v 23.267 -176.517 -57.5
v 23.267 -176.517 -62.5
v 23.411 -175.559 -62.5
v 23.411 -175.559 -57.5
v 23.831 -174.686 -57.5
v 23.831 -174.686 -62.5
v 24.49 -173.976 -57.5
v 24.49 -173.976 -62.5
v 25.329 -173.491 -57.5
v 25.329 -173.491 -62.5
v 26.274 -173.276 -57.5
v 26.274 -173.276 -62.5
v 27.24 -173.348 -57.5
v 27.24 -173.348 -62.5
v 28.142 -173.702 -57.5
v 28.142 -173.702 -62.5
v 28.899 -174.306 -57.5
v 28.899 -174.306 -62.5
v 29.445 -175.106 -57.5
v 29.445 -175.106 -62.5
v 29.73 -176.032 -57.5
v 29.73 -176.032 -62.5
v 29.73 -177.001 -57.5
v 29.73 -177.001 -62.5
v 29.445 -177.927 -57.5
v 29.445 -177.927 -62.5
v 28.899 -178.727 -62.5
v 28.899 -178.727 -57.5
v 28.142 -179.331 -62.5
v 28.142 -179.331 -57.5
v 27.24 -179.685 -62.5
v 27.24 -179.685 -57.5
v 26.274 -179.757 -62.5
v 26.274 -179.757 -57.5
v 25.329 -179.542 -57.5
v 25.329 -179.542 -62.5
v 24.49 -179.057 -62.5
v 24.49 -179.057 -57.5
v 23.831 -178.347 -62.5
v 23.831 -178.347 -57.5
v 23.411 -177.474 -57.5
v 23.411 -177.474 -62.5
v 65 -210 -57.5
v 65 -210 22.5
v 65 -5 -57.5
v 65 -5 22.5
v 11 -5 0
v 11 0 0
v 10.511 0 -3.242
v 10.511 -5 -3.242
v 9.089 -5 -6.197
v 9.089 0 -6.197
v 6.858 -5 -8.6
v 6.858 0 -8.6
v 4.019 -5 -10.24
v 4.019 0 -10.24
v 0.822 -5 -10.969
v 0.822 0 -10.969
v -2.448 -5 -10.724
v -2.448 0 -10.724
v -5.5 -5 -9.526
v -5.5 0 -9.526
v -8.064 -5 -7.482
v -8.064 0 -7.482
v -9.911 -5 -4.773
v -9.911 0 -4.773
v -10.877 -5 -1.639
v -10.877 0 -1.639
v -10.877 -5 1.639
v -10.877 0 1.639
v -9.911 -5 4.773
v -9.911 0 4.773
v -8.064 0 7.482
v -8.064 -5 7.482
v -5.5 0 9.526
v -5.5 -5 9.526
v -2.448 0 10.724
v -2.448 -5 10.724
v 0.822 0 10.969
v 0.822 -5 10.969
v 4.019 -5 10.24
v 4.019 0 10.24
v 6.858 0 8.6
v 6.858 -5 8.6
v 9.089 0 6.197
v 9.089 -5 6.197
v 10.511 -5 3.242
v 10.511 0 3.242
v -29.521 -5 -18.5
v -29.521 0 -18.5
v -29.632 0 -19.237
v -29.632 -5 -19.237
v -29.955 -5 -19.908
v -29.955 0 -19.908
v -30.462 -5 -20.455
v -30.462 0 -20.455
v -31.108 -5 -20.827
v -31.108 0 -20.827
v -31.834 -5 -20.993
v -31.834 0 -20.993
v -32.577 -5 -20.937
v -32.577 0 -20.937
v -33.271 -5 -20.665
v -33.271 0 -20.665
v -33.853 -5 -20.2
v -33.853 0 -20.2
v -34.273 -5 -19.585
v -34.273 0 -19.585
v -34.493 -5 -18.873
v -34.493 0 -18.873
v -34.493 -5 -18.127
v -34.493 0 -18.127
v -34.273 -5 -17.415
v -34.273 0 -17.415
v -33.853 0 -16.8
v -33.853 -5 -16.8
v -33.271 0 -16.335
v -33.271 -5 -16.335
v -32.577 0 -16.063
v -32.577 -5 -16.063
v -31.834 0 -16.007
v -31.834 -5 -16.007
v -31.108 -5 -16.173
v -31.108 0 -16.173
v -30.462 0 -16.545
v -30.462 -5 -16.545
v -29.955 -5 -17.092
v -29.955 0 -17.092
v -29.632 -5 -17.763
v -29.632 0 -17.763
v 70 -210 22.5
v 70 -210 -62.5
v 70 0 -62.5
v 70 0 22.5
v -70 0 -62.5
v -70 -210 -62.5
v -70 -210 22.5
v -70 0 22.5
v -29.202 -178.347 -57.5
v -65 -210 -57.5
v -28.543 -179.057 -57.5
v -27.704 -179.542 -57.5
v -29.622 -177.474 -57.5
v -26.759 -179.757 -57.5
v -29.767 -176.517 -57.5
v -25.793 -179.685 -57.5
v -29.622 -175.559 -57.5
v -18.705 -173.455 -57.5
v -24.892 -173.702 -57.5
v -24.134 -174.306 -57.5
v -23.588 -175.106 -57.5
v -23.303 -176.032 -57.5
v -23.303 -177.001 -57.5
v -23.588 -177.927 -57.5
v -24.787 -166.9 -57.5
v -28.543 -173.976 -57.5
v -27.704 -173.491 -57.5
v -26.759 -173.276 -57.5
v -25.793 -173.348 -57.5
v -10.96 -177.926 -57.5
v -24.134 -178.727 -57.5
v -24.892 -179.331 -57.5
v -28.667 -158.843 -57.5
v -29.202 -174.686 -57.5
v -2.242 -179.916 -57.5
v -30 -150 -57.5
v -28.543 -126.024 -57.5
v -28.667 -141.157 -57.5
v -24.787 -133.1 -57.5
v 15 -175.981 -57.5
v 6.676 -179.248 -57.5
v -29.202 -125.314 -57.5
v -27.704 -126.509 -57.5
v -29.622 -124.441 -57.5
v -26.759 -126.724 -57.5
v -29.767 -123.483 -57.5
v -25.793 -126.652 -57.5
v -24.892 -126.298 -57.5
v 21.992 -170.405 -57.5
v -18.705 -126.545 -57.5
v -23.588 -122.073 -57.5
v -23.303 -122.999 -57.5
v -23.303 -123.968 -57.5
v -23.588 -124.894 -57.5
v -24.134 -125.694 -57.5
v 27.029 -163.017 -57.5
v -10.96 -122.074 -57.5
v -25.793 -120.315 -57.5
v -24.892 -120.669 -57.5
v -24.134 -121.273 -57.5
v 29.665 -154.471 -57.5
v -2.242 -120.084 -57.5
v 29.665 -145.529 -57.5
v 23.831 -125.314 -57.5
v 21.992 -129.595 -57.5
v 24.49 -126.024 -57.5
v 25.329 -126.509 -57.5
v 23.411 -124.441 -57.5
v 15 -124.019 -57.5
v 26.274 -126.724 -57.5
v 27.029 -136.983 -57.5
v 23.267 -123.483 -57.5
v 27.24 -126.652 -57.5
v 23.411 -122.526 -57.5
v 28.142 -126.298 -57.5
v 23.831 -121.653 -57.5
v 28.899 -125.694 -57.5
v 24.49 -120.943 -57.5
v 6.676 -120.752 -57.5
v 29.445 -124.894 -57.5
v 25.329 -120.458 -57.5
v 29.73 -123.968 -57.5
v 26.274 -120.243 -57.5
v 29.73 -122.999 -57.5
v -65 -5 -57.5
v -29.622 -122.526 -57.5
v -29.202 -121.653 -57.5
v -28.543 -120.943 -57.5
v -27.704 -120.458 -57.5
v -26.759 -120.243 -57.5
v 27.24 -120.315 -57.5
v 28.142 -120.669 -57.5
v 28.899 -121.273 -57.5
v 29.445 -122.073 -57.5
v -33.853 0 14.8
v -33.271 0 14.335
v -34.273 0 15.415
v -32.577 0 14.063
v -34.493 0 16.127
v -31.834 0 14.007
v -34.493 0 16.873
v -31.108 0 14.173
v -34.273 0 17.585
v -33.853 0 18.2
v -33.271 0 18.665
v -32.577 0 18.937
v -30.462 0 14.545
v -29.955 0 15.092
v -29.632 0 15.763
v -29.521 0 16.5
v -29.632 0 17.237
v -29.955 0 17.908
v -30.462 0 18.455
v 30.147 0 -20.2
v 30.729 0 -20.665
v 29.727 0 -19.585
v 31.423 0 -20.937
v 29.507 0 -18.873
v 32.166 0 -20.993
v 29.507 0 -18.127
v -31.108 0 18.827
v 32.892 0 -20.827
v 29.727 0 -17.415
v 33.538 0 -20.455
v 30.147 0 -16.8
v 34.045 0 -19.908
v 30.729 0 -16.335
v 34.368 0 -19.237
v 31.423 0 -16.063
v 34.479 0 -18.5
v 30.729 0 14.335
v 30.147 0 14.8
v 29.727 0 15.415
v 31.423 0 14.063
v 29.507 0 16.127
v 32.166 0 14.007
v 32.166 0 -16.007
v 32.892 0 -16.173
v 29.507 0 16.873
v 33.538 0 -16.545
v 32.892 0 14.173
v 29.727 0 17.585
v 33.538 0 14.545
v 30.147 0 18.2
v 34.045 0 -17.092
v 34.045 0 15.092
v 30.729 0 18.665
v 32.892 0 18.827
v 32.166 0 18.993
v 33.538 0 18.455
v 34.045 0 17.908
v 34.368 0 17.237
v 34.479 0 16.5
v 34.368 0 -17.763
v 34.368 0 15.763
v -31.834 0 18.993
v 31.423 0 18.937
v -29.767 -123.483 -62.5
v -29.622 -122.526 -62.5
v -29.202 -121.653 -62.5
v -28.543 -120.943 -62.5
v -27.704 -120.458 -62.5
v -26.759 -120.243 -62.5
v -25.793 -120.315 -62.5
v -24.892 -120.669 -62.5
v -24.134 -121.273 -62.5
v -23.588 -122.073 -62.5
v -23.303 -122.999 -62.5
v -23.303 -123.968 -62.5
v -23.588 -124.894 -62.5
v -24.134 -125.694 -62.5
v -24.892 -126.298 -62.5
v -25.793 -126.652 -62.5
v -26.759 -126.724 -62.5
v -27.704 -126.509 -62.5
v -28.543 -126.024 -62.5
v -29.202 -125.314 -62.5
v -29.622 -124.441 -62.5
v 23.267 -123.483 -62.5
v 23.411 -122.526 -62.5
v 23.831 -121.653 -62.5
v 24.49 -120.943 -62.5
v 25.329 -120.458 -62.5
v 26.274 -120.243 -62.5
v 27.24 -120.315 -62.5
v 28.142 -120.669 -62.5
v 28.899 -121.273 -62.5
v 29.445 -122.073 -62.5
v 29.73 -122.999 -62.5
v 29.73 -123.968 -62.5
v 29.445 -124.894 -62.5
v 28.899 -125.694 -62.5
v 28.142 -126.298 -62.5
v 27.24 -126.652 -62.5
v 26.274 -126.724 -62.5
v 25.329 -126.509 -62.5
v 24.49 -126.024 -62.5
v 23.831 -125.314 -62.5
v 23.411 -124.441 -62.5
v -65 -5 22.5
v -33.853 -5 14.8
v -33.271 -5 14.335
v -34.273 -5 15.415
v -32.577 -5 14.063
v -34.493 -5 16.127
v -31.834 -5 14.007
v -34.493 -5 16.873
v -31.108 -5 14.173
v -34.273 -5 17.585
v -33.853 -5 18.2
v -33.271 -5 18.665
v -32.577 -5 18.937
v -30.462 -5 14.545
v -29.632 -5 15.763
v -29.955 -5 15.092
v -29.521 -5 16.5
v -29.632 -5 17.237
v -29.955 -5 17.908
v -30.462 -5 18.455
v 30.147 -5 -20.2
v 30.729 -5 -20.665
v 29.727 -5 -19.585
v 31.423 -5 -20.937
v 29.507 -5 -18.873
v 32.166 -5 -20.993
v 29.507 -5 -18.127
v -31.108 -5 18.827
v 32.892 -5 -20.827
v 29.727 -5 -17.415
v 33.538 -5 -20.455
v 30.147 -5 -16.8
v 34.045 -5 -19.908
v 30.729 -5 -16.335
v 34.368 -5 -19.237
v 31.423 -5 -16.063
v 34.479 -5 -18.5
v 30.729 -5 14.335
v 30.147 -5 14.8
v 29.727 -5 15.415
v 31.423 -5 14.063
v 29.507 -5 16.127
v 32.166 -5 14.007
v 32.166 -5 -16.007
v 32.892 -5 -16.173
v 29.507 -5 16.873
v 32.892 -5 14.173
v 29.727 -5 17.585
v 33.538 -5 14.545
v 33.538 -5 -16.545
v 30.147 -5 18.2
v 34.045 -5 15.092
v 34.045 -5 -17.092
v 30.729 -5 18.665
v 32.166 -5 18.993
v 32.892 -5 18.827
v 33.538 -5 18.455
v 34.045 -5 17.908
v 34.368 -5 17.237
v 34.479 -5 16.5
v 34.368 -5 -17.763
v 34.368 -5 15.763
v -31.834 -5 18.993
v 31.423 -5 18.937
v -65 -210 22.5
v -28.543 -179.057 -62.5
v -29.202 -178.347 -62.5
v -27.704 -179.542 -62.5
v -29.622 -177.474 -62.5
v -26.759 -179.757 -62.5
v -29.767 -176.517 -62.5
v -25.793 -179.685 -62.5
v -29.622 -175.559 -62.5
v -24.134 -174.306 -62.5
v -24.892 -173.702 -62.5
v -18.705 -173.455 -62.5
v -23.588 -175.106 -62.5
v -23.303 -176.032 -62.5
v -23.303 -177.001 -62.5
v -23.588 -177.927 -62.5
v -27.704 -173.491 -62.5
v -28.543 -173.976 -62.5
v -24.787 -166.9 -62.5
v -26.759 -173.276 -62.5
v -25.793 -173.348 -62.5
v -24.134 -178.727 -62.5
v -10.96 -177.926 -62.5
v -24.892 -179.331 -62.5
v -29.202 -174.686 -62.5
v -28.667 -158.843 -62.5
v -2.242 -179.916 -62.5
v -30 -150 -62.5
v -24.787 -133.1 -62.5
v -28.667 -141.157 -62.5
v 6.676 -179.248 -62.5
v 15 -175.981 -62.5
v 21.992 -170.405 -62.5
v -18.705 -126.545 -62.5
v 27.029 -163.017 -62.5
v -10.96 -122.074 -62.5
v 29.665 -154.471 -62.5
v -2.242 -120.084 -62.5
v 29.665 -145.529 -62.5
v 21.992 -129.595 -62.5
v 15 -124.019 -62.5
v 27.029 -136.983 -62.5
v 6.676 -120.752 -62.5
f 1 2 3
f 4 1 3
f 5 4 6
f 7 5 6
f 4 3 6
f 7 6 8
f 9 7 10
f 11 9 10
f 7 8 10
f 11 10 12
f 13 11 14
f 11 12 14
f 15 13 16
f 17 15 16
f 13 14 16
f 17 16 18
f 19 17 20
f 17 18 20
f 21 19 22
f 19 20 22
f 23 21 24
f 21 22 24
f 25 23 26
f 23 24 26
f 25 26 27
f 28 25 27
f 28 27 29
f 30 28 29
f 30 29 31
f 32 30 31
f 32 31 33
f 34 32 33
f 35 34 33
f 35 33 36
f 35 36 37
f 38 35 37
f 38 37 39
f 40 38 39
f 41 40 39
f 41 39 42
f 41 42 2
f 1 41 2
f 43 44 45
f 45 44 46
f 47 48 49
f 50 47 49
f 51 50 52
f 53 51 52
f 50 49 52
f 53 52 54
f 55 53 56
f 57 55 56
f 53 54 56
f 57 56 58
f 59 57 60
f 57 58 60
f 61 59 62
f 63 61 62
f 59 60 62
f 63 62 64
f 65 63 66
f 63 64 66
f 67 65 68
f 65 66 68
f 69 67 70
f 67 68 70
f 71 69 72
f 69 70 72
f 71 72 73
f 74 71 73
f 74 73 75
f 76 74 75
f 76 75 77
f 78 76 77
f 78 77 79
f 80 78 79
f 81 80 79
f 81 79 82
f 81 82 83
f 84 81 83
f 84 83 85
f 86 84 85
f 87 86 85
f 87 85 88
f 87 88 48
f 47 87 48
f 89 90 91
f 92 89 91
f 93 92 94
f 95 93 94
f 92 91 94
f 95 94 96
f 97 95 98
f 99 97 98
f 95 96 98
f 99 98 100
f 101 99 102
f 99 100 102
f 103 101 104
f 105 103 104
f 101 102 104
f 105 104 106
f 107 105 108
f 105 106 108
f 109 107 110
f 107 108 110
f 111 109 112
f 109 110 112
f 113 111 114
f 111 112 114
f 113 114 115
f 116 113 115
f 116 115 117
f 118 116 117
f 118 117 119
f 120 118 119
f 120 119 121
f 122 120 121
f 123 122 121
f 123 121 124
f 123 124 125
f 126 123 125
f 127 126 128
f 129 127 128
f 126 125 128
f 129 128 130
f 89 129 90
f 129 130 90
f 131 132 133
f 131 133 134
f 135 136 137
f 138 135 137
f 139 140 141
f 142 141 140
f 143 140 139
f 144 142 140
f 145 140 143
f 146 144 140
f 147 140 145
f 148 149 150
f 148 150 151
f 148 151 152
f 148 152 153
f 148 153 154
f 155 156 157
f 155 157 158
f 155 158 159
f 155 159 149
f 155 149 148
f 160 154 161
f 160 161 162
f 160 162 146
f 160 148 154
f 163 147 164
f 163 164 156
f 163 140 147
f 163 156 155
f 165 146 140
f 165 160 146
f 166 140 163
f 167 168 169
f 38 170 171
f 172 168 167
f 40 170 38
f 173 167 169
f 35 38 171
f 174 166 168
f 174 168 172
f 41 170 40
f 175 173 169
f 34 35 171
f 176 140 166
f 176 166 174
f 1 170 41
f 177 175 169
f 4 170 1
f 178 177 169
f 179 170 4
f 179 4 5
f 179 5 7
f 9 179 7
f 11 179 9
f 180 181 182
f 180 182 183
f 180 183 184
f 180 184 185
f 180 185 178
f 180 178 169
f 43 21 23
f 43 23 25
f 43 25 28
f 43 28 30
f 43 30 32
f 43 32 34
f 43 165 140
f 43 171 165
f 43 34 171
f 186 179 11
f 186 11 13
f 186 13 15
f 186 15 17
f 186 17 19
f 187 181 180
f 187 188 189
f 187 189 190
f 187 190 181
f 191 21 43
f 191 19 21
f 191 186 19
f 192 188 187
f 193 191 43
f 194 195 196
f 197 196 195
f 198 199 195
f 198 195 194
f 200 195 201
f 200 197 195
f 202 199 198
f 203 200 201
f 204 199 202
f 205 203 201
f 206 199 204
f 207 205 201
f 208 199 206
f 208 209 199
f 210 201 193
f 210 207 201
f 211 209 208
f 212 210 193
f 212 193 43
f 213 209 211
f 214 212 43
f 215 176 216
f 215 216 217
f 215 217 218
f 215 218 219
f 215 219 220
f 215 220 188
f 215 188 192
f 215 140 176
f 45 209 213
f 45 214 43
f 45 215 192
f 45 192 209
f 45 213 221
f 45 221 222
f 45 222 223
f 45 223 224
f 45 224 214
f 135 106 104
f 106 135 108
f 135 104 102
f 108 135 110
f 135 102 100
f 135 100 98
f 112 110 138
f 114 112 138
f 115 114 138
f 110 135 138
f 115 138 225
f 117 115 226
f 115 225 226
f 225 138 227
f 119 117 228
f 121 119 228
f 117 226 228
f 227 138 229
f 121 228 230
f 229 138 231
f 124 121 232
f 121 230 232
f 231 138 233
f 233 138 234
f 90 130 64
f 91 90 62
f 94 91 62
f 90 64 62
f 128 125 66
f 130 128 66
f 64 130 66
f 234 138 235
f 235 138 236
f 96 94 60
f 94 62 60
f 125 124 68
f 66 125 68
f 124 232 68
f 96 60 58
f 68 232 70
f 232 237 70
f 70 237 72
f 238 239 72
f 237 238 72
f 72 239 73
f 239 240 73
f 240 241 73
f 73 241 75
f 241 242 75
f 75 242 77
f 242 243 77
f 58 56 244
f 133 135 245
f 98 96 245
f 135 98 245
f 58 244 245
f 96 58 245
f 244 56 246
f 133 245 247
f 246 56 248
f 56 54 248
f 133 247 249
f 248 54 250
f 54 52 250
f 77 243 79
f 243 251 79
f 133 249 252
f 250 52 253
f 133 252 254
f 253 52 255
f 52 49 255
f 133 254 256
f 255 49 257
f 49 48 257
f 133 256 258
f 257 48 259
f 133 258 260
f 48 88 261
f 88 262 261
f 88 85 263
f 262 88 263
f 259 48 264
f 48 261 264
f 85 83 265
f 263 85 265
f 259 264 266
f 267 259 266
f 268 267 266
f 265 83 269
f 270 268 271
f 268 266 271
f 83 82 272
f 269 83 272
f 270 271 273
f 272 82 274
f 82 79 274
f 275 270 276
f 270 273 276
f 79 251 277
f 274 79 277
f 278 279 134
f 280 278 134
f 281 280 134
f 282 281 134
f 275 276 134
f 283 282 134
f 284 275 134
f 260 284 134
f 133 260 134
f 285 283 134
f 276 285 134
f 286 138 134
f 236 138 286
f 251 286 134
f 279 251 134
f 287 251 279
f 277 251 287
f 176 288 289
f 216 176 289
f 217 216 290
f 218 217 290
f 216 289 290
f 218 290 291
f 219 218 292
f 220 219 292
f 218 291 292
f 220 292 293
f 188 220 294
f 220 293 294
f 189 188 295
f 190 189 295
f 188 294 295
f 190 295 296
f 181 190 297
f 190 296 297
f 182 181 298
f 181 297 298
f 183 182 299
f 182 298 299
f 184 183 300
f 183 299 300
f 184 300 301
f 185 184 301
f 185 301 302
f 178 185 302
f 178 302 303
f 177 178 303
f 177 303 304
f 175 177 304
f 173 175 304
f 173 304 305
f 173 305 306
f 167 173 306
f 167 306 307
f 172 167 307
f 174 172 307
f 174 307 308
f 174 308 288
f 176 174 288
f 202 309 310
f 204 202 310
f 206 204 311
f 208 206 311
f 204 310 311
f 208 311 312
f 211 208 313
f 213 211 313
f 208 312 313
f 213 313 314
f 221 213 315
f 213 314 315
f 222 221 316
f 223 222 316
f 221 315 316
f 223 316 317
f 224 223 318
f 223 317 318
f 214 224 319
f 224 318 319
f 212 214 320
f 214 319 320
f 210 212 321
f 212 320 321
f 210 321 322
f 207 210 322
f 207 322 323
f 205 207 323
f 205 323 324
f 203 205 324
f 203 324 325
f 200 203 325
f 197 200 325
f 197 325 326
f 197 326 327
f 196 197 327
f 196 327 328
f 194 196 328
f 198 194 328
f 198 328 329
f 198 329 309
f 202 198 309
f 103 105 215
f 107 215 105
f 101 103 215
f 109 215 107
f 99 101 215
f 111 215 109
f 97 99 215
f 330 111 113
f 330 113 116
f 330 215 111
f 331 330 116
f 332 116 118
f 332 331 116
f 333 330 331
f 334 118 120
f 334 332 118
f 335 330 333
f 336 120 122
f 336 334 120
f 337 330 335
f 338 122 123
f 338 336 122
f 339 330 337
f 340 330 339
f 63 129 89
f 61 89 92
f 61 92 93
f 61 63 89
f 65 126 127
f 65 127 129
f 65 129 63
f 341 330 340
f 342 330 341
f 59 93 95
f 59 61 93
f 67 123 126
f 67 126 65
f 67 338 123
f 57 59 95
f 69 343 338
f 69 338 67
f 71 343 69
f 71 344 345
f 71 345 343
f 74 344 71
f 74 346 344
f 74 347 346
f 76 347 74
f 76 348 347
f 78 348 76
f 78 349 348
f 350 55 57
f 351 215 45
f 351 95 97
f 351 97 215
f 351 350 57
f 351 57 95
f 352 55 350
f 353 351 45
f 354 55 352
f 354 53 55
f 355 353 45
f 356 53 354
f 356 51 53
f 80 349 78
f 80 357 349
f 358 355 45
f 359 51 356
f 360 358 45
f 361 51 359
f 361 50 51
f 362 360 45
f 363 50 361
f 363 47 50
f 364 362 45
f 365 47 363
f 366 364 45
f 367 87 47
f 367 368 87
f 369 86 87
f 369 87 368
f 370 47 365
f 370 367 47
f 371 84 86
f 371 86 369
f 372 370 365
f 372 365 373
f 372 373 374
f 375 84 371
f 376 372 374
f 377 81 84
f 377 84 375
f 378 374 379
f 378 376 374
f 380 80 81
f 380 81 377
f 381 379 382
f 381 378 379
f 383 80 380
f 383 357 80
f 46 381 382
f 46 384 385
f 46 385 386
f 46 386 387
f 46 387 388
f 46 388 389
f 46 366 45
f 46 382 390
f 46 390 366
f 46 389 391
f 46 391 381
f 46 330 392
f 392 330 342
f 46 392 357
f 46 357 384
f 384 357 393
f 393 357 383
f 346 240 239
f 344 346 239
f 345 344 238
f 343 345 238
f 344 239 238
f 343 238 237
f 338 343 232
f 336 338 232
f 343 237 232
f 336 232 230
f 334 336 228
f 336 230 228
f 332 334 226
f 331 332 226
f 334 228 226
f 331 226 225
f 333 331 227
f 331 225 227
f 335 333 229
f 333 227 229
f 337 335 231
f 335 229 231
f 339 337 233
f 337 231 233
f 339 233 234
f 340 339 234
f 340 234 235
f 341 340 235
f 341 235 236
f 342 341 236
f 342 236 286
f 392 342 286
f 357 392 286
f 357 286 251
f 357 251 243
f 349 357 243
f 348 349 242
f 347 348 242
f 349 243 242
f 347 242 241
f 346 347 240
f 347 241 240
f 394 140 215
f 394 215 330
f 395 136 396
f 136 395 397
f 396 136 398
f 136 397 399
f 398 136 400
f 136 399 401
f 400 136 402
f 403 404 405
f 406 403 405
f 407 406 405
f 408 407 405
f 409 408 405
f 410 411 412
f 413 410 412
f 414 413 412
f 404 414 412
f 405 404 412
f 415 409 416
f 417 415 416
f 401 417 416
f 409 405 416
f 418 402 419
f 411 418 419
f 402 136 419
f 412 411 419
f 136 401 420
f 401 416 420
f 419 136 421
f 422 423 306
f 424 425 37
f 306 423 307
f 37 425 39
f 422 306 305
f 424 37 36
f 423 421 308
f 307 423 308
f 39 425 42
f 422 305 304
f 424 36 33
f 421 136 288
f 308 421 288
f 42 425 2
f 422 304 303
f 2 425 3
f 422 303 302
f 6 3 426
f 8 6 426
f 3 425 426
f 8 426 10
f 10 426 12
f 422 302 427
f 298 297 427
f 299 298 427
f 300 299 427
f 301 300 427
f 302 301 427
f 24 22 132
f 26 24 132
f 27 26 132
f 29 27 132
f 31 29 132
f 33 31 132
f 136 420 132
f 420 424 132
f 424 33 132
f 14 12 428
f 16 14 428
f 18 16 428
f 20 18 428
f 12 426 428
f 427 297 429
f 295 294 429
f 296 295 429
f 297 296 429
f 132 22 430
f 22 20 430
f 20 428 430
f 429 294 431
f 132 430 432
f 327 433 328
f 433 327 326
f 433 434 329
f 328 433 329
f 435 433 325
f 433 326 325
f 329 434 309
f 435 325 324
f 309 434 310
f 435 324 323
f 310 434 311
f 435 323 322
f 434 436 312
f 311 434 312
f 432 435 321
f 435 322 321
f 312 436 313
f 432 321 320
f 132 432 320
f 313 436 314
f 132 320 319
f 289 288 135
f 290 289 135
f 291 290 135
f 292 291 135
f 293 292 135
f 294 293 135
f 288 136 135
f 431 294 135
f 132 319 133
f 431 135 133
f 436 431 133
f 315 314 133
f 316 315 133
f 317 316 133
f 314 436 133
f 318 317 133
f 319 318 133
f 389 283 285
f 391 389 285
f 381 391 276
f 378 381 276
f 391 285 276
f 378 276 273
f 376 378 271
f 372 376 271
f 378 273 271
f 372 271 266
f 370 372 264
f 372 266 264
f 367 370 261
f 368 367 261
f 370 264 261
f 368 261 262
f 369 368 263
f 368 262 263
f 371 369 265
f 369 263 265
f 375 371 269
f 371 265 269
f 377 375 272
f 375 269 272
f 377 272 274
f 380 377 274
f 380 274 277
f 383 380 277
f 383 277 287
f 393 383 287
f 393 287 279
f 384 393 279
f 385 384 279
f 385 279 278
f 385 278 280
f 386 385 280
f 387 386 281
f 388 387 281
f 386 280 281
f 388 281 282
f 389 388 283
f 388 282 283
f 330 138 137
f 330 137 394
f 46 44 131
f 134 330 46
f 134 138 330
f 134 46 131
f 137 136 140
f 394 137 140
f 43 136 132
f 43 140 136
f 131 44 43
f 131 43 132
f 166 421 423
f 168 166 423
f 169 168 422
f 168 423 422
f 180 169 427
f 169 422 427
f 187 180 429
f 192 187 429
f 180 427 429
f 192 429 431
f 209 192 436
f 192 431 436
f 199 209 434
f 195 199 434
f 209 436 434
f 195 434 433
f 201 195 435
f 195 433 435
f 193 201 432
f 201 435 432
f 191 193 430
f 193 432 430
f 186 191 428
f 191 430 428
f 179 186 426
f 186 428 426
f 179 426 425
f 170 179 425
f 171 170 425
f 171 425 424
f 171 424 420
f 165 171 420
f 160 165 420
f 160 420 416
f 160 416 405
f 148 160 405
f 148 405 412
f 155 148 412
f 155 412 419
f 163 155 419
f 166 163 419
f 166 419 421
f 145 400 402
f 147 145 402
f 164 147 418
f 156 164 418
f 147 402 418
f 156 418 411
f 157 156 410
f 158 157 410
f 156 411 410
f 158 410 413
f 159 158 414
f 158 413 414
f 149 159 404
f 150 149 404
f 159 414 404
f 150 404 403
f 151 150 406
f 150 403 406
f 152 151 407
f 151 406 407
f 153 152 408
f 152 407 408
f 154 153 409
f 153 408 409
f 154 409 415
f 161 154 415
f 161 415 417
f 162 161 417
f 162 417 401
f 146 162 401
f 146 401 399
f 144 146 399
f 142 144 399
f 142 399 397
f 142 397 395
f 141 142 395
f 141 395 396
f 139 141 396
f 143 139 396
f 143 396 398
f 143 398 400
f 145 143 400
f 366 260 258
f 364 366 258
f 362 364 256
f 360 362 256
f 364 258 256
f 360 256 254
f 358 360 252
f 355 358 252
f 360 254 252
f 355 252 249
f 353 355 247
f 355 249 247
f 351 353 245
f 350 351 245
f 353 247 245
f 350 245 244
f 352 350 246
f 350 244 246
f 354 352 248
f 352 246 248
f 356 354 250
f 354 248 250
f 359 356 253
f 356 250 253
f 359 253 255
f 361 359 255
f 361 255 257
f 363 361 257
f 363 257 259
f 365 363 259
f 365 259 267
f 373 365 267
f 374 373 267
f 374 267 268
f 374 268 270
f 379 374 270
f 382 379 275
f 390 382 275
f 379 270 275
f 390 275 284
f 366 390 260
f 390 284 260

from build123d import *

# Parameters (mm, degrees)
SKETCH_1_R          = 13
EXTRUDE_1_DEPTH     = 20
SKETCH_2_R          = 13
EXTRUDE_2_DEPTH     = 400
SKETCH_4_W          = 140
SKETCH_4_H          = 85
EXTRUDE_3_DEPTH     = 210
SHELL_2_T           = -5
SKETCH_5_W          = 130
SKETCH_5_H          = 5
CUT_EXTRUDE_3_DEPTH = 80
SKETCH_6_R          = 30
SKETCH_6_R_2        = 3.25
CUT_EXTRUDE_4_DEPTH = 10
SKETCH_3_R          = 11
CUT_EXTRUDE_5_DEPTH = 425
SKETCH_7_R          = 13
CUT_EXTRUDE_6_DEPTH = 420
SKETCH_8_R          = 2.5
CUT_EXTRUDE_7_DEPTH = 5


with BuildPart() as part:
    # 草图1 → 凸台-拉伸1 (new body)
    with BuildSketch(Plane(origin=(0, 0, 0), x_dir=(1, 0, 0), z_dir=(0, 1, 0))):
        Circle(SKETCH_1_R)
    extrude(amount=EXTRUDE_1_DEPTH)

    # 草图2 → 凸台-拉伸2 (add)
    with BuildSketch(Plane(origin=(0, 20, 0), x_dir=(1, 0, 0), z_dir=(0, 1, 0))):
        Circle(SKETCH_2_R)
    extrude(amount=EXTRUDE_2_DEPTH)


with BuildPart() as body_2:
    # 草图4 → 凸台-拉伸3 (new body)
    with BuildSketch(Plane.XZ):
        with Locations((0, -20)):
            Rectangle(SKETCH_4_W, SKETCH_4_H)
    extrude(amount=EXTRUDE_3_DEPTH)

    # 抽壳2
    shell_2_openings = [body_2.faces().sort_by_distance(p)[0] for p in [
        (0, -105, 22.5),
    ]]
    offset(amount=SHELL_2_T, openings=shell_2_openings, kind=Kind.INTERSECTION)

    # 草图5 → 切除-拉伸3 (cut)
    with BuildSketch(Plane.XY.offset(22.5)):
        with Locations((0, -207.5)):
            Rectangle(SKETCH_5_W, SKETCH_5_H)
    extrude(amount=-CUT_EXTRUDE_3_DEPTH, mode=Mode.SUBTRACT)

    # 草图6 → 切除-拉伸4 (cut)
    with BuildSketch(Plane(origin=(0, 0, -62.5), x_dir=(-1, 0, 0), z_dir=(0, 0, -1))):
        with Locations((0, -150)):
            Circle(SKETCH_6_R)
        with Locations((26.516504294, -123.483495706)):
            Circle(SKETCH_6_R_2)
        with Locations((26.516504294, -176.516504294)):
            Circle(SKETCH_6_R_2)
        with Locations((-26.516504294, -176.516504294)):
            Circle(SKETCH_6_R_2)
        with Locations((-26.516504294, -123.483495706)):
            Circle(SKETCH_6_R_2)
    extrude(amount=-CUT_EXTRUDE_4_DEPTH, mode=Mode.SUBTRACT)


with BuildPart() as cut_extrude_5_tool:
    # 草图3 → 切除-拉伸5 (new body)
    with BuildSketch(Plane(origin=(0, 420, 0), x_dir=(1, 0, 0), z_dir=(0, 1, 0))):
        Circle(SKETCH_3_R)
    extrude(amount=-CUT_EXTRUDE_5_DEPTH)


with BuildPart() as part_1:
    add(part.part)

    # 切除-拉伸5: cut by cut_extrude_5_tool
    add(cut_extrude_5_tool.part, mode=Mode.SUBTRACT)

    # 草图7 → 切除-拉伸6 (cut)
    with BuildSketch(Plane(origin=(0, 420, 0), x_dir=(1, 0, 0), z_dir=(0, 1, 0))):
        Circle(SKETCH_7_R)
    extrude(amount=-CUT_EXTRUDE_6_DEPTH, mode=Mode.SUBTRACT)


with BuildPart() as body_2_1:
    add(body_2.part)

    # 切除-拉伸5: cut by cut_extrude_5_tool
    add(cut_extrude_5_tool.part, mode=Mode.SUBTRACT)

    # 草图8 → 切除-拉伸7 (cut)
    with BuildSketch(Plane(origin=(0, 0, 0), x_dir=(1, 0, 0), z_dir=(0, 1, 0))):
        with Locations((-32.020865922, -16.5)):
            Circle(SKETCH_8_R)
        with Locations((-32.020865922, 18.5)):
            Circle(SKETCH_8_R)
        with Locations((31.979134078, -16.5)):
            Circle(SKETCH_8_R)
        with Locations((31.979134078, 18.5)):
            Circle(SKETCH_8_R)
    extrude(amount=-CUT_EXTRUDE_7_DEPTH, mode=Mode.SUBTRACT)


solid = body_2_1.part
